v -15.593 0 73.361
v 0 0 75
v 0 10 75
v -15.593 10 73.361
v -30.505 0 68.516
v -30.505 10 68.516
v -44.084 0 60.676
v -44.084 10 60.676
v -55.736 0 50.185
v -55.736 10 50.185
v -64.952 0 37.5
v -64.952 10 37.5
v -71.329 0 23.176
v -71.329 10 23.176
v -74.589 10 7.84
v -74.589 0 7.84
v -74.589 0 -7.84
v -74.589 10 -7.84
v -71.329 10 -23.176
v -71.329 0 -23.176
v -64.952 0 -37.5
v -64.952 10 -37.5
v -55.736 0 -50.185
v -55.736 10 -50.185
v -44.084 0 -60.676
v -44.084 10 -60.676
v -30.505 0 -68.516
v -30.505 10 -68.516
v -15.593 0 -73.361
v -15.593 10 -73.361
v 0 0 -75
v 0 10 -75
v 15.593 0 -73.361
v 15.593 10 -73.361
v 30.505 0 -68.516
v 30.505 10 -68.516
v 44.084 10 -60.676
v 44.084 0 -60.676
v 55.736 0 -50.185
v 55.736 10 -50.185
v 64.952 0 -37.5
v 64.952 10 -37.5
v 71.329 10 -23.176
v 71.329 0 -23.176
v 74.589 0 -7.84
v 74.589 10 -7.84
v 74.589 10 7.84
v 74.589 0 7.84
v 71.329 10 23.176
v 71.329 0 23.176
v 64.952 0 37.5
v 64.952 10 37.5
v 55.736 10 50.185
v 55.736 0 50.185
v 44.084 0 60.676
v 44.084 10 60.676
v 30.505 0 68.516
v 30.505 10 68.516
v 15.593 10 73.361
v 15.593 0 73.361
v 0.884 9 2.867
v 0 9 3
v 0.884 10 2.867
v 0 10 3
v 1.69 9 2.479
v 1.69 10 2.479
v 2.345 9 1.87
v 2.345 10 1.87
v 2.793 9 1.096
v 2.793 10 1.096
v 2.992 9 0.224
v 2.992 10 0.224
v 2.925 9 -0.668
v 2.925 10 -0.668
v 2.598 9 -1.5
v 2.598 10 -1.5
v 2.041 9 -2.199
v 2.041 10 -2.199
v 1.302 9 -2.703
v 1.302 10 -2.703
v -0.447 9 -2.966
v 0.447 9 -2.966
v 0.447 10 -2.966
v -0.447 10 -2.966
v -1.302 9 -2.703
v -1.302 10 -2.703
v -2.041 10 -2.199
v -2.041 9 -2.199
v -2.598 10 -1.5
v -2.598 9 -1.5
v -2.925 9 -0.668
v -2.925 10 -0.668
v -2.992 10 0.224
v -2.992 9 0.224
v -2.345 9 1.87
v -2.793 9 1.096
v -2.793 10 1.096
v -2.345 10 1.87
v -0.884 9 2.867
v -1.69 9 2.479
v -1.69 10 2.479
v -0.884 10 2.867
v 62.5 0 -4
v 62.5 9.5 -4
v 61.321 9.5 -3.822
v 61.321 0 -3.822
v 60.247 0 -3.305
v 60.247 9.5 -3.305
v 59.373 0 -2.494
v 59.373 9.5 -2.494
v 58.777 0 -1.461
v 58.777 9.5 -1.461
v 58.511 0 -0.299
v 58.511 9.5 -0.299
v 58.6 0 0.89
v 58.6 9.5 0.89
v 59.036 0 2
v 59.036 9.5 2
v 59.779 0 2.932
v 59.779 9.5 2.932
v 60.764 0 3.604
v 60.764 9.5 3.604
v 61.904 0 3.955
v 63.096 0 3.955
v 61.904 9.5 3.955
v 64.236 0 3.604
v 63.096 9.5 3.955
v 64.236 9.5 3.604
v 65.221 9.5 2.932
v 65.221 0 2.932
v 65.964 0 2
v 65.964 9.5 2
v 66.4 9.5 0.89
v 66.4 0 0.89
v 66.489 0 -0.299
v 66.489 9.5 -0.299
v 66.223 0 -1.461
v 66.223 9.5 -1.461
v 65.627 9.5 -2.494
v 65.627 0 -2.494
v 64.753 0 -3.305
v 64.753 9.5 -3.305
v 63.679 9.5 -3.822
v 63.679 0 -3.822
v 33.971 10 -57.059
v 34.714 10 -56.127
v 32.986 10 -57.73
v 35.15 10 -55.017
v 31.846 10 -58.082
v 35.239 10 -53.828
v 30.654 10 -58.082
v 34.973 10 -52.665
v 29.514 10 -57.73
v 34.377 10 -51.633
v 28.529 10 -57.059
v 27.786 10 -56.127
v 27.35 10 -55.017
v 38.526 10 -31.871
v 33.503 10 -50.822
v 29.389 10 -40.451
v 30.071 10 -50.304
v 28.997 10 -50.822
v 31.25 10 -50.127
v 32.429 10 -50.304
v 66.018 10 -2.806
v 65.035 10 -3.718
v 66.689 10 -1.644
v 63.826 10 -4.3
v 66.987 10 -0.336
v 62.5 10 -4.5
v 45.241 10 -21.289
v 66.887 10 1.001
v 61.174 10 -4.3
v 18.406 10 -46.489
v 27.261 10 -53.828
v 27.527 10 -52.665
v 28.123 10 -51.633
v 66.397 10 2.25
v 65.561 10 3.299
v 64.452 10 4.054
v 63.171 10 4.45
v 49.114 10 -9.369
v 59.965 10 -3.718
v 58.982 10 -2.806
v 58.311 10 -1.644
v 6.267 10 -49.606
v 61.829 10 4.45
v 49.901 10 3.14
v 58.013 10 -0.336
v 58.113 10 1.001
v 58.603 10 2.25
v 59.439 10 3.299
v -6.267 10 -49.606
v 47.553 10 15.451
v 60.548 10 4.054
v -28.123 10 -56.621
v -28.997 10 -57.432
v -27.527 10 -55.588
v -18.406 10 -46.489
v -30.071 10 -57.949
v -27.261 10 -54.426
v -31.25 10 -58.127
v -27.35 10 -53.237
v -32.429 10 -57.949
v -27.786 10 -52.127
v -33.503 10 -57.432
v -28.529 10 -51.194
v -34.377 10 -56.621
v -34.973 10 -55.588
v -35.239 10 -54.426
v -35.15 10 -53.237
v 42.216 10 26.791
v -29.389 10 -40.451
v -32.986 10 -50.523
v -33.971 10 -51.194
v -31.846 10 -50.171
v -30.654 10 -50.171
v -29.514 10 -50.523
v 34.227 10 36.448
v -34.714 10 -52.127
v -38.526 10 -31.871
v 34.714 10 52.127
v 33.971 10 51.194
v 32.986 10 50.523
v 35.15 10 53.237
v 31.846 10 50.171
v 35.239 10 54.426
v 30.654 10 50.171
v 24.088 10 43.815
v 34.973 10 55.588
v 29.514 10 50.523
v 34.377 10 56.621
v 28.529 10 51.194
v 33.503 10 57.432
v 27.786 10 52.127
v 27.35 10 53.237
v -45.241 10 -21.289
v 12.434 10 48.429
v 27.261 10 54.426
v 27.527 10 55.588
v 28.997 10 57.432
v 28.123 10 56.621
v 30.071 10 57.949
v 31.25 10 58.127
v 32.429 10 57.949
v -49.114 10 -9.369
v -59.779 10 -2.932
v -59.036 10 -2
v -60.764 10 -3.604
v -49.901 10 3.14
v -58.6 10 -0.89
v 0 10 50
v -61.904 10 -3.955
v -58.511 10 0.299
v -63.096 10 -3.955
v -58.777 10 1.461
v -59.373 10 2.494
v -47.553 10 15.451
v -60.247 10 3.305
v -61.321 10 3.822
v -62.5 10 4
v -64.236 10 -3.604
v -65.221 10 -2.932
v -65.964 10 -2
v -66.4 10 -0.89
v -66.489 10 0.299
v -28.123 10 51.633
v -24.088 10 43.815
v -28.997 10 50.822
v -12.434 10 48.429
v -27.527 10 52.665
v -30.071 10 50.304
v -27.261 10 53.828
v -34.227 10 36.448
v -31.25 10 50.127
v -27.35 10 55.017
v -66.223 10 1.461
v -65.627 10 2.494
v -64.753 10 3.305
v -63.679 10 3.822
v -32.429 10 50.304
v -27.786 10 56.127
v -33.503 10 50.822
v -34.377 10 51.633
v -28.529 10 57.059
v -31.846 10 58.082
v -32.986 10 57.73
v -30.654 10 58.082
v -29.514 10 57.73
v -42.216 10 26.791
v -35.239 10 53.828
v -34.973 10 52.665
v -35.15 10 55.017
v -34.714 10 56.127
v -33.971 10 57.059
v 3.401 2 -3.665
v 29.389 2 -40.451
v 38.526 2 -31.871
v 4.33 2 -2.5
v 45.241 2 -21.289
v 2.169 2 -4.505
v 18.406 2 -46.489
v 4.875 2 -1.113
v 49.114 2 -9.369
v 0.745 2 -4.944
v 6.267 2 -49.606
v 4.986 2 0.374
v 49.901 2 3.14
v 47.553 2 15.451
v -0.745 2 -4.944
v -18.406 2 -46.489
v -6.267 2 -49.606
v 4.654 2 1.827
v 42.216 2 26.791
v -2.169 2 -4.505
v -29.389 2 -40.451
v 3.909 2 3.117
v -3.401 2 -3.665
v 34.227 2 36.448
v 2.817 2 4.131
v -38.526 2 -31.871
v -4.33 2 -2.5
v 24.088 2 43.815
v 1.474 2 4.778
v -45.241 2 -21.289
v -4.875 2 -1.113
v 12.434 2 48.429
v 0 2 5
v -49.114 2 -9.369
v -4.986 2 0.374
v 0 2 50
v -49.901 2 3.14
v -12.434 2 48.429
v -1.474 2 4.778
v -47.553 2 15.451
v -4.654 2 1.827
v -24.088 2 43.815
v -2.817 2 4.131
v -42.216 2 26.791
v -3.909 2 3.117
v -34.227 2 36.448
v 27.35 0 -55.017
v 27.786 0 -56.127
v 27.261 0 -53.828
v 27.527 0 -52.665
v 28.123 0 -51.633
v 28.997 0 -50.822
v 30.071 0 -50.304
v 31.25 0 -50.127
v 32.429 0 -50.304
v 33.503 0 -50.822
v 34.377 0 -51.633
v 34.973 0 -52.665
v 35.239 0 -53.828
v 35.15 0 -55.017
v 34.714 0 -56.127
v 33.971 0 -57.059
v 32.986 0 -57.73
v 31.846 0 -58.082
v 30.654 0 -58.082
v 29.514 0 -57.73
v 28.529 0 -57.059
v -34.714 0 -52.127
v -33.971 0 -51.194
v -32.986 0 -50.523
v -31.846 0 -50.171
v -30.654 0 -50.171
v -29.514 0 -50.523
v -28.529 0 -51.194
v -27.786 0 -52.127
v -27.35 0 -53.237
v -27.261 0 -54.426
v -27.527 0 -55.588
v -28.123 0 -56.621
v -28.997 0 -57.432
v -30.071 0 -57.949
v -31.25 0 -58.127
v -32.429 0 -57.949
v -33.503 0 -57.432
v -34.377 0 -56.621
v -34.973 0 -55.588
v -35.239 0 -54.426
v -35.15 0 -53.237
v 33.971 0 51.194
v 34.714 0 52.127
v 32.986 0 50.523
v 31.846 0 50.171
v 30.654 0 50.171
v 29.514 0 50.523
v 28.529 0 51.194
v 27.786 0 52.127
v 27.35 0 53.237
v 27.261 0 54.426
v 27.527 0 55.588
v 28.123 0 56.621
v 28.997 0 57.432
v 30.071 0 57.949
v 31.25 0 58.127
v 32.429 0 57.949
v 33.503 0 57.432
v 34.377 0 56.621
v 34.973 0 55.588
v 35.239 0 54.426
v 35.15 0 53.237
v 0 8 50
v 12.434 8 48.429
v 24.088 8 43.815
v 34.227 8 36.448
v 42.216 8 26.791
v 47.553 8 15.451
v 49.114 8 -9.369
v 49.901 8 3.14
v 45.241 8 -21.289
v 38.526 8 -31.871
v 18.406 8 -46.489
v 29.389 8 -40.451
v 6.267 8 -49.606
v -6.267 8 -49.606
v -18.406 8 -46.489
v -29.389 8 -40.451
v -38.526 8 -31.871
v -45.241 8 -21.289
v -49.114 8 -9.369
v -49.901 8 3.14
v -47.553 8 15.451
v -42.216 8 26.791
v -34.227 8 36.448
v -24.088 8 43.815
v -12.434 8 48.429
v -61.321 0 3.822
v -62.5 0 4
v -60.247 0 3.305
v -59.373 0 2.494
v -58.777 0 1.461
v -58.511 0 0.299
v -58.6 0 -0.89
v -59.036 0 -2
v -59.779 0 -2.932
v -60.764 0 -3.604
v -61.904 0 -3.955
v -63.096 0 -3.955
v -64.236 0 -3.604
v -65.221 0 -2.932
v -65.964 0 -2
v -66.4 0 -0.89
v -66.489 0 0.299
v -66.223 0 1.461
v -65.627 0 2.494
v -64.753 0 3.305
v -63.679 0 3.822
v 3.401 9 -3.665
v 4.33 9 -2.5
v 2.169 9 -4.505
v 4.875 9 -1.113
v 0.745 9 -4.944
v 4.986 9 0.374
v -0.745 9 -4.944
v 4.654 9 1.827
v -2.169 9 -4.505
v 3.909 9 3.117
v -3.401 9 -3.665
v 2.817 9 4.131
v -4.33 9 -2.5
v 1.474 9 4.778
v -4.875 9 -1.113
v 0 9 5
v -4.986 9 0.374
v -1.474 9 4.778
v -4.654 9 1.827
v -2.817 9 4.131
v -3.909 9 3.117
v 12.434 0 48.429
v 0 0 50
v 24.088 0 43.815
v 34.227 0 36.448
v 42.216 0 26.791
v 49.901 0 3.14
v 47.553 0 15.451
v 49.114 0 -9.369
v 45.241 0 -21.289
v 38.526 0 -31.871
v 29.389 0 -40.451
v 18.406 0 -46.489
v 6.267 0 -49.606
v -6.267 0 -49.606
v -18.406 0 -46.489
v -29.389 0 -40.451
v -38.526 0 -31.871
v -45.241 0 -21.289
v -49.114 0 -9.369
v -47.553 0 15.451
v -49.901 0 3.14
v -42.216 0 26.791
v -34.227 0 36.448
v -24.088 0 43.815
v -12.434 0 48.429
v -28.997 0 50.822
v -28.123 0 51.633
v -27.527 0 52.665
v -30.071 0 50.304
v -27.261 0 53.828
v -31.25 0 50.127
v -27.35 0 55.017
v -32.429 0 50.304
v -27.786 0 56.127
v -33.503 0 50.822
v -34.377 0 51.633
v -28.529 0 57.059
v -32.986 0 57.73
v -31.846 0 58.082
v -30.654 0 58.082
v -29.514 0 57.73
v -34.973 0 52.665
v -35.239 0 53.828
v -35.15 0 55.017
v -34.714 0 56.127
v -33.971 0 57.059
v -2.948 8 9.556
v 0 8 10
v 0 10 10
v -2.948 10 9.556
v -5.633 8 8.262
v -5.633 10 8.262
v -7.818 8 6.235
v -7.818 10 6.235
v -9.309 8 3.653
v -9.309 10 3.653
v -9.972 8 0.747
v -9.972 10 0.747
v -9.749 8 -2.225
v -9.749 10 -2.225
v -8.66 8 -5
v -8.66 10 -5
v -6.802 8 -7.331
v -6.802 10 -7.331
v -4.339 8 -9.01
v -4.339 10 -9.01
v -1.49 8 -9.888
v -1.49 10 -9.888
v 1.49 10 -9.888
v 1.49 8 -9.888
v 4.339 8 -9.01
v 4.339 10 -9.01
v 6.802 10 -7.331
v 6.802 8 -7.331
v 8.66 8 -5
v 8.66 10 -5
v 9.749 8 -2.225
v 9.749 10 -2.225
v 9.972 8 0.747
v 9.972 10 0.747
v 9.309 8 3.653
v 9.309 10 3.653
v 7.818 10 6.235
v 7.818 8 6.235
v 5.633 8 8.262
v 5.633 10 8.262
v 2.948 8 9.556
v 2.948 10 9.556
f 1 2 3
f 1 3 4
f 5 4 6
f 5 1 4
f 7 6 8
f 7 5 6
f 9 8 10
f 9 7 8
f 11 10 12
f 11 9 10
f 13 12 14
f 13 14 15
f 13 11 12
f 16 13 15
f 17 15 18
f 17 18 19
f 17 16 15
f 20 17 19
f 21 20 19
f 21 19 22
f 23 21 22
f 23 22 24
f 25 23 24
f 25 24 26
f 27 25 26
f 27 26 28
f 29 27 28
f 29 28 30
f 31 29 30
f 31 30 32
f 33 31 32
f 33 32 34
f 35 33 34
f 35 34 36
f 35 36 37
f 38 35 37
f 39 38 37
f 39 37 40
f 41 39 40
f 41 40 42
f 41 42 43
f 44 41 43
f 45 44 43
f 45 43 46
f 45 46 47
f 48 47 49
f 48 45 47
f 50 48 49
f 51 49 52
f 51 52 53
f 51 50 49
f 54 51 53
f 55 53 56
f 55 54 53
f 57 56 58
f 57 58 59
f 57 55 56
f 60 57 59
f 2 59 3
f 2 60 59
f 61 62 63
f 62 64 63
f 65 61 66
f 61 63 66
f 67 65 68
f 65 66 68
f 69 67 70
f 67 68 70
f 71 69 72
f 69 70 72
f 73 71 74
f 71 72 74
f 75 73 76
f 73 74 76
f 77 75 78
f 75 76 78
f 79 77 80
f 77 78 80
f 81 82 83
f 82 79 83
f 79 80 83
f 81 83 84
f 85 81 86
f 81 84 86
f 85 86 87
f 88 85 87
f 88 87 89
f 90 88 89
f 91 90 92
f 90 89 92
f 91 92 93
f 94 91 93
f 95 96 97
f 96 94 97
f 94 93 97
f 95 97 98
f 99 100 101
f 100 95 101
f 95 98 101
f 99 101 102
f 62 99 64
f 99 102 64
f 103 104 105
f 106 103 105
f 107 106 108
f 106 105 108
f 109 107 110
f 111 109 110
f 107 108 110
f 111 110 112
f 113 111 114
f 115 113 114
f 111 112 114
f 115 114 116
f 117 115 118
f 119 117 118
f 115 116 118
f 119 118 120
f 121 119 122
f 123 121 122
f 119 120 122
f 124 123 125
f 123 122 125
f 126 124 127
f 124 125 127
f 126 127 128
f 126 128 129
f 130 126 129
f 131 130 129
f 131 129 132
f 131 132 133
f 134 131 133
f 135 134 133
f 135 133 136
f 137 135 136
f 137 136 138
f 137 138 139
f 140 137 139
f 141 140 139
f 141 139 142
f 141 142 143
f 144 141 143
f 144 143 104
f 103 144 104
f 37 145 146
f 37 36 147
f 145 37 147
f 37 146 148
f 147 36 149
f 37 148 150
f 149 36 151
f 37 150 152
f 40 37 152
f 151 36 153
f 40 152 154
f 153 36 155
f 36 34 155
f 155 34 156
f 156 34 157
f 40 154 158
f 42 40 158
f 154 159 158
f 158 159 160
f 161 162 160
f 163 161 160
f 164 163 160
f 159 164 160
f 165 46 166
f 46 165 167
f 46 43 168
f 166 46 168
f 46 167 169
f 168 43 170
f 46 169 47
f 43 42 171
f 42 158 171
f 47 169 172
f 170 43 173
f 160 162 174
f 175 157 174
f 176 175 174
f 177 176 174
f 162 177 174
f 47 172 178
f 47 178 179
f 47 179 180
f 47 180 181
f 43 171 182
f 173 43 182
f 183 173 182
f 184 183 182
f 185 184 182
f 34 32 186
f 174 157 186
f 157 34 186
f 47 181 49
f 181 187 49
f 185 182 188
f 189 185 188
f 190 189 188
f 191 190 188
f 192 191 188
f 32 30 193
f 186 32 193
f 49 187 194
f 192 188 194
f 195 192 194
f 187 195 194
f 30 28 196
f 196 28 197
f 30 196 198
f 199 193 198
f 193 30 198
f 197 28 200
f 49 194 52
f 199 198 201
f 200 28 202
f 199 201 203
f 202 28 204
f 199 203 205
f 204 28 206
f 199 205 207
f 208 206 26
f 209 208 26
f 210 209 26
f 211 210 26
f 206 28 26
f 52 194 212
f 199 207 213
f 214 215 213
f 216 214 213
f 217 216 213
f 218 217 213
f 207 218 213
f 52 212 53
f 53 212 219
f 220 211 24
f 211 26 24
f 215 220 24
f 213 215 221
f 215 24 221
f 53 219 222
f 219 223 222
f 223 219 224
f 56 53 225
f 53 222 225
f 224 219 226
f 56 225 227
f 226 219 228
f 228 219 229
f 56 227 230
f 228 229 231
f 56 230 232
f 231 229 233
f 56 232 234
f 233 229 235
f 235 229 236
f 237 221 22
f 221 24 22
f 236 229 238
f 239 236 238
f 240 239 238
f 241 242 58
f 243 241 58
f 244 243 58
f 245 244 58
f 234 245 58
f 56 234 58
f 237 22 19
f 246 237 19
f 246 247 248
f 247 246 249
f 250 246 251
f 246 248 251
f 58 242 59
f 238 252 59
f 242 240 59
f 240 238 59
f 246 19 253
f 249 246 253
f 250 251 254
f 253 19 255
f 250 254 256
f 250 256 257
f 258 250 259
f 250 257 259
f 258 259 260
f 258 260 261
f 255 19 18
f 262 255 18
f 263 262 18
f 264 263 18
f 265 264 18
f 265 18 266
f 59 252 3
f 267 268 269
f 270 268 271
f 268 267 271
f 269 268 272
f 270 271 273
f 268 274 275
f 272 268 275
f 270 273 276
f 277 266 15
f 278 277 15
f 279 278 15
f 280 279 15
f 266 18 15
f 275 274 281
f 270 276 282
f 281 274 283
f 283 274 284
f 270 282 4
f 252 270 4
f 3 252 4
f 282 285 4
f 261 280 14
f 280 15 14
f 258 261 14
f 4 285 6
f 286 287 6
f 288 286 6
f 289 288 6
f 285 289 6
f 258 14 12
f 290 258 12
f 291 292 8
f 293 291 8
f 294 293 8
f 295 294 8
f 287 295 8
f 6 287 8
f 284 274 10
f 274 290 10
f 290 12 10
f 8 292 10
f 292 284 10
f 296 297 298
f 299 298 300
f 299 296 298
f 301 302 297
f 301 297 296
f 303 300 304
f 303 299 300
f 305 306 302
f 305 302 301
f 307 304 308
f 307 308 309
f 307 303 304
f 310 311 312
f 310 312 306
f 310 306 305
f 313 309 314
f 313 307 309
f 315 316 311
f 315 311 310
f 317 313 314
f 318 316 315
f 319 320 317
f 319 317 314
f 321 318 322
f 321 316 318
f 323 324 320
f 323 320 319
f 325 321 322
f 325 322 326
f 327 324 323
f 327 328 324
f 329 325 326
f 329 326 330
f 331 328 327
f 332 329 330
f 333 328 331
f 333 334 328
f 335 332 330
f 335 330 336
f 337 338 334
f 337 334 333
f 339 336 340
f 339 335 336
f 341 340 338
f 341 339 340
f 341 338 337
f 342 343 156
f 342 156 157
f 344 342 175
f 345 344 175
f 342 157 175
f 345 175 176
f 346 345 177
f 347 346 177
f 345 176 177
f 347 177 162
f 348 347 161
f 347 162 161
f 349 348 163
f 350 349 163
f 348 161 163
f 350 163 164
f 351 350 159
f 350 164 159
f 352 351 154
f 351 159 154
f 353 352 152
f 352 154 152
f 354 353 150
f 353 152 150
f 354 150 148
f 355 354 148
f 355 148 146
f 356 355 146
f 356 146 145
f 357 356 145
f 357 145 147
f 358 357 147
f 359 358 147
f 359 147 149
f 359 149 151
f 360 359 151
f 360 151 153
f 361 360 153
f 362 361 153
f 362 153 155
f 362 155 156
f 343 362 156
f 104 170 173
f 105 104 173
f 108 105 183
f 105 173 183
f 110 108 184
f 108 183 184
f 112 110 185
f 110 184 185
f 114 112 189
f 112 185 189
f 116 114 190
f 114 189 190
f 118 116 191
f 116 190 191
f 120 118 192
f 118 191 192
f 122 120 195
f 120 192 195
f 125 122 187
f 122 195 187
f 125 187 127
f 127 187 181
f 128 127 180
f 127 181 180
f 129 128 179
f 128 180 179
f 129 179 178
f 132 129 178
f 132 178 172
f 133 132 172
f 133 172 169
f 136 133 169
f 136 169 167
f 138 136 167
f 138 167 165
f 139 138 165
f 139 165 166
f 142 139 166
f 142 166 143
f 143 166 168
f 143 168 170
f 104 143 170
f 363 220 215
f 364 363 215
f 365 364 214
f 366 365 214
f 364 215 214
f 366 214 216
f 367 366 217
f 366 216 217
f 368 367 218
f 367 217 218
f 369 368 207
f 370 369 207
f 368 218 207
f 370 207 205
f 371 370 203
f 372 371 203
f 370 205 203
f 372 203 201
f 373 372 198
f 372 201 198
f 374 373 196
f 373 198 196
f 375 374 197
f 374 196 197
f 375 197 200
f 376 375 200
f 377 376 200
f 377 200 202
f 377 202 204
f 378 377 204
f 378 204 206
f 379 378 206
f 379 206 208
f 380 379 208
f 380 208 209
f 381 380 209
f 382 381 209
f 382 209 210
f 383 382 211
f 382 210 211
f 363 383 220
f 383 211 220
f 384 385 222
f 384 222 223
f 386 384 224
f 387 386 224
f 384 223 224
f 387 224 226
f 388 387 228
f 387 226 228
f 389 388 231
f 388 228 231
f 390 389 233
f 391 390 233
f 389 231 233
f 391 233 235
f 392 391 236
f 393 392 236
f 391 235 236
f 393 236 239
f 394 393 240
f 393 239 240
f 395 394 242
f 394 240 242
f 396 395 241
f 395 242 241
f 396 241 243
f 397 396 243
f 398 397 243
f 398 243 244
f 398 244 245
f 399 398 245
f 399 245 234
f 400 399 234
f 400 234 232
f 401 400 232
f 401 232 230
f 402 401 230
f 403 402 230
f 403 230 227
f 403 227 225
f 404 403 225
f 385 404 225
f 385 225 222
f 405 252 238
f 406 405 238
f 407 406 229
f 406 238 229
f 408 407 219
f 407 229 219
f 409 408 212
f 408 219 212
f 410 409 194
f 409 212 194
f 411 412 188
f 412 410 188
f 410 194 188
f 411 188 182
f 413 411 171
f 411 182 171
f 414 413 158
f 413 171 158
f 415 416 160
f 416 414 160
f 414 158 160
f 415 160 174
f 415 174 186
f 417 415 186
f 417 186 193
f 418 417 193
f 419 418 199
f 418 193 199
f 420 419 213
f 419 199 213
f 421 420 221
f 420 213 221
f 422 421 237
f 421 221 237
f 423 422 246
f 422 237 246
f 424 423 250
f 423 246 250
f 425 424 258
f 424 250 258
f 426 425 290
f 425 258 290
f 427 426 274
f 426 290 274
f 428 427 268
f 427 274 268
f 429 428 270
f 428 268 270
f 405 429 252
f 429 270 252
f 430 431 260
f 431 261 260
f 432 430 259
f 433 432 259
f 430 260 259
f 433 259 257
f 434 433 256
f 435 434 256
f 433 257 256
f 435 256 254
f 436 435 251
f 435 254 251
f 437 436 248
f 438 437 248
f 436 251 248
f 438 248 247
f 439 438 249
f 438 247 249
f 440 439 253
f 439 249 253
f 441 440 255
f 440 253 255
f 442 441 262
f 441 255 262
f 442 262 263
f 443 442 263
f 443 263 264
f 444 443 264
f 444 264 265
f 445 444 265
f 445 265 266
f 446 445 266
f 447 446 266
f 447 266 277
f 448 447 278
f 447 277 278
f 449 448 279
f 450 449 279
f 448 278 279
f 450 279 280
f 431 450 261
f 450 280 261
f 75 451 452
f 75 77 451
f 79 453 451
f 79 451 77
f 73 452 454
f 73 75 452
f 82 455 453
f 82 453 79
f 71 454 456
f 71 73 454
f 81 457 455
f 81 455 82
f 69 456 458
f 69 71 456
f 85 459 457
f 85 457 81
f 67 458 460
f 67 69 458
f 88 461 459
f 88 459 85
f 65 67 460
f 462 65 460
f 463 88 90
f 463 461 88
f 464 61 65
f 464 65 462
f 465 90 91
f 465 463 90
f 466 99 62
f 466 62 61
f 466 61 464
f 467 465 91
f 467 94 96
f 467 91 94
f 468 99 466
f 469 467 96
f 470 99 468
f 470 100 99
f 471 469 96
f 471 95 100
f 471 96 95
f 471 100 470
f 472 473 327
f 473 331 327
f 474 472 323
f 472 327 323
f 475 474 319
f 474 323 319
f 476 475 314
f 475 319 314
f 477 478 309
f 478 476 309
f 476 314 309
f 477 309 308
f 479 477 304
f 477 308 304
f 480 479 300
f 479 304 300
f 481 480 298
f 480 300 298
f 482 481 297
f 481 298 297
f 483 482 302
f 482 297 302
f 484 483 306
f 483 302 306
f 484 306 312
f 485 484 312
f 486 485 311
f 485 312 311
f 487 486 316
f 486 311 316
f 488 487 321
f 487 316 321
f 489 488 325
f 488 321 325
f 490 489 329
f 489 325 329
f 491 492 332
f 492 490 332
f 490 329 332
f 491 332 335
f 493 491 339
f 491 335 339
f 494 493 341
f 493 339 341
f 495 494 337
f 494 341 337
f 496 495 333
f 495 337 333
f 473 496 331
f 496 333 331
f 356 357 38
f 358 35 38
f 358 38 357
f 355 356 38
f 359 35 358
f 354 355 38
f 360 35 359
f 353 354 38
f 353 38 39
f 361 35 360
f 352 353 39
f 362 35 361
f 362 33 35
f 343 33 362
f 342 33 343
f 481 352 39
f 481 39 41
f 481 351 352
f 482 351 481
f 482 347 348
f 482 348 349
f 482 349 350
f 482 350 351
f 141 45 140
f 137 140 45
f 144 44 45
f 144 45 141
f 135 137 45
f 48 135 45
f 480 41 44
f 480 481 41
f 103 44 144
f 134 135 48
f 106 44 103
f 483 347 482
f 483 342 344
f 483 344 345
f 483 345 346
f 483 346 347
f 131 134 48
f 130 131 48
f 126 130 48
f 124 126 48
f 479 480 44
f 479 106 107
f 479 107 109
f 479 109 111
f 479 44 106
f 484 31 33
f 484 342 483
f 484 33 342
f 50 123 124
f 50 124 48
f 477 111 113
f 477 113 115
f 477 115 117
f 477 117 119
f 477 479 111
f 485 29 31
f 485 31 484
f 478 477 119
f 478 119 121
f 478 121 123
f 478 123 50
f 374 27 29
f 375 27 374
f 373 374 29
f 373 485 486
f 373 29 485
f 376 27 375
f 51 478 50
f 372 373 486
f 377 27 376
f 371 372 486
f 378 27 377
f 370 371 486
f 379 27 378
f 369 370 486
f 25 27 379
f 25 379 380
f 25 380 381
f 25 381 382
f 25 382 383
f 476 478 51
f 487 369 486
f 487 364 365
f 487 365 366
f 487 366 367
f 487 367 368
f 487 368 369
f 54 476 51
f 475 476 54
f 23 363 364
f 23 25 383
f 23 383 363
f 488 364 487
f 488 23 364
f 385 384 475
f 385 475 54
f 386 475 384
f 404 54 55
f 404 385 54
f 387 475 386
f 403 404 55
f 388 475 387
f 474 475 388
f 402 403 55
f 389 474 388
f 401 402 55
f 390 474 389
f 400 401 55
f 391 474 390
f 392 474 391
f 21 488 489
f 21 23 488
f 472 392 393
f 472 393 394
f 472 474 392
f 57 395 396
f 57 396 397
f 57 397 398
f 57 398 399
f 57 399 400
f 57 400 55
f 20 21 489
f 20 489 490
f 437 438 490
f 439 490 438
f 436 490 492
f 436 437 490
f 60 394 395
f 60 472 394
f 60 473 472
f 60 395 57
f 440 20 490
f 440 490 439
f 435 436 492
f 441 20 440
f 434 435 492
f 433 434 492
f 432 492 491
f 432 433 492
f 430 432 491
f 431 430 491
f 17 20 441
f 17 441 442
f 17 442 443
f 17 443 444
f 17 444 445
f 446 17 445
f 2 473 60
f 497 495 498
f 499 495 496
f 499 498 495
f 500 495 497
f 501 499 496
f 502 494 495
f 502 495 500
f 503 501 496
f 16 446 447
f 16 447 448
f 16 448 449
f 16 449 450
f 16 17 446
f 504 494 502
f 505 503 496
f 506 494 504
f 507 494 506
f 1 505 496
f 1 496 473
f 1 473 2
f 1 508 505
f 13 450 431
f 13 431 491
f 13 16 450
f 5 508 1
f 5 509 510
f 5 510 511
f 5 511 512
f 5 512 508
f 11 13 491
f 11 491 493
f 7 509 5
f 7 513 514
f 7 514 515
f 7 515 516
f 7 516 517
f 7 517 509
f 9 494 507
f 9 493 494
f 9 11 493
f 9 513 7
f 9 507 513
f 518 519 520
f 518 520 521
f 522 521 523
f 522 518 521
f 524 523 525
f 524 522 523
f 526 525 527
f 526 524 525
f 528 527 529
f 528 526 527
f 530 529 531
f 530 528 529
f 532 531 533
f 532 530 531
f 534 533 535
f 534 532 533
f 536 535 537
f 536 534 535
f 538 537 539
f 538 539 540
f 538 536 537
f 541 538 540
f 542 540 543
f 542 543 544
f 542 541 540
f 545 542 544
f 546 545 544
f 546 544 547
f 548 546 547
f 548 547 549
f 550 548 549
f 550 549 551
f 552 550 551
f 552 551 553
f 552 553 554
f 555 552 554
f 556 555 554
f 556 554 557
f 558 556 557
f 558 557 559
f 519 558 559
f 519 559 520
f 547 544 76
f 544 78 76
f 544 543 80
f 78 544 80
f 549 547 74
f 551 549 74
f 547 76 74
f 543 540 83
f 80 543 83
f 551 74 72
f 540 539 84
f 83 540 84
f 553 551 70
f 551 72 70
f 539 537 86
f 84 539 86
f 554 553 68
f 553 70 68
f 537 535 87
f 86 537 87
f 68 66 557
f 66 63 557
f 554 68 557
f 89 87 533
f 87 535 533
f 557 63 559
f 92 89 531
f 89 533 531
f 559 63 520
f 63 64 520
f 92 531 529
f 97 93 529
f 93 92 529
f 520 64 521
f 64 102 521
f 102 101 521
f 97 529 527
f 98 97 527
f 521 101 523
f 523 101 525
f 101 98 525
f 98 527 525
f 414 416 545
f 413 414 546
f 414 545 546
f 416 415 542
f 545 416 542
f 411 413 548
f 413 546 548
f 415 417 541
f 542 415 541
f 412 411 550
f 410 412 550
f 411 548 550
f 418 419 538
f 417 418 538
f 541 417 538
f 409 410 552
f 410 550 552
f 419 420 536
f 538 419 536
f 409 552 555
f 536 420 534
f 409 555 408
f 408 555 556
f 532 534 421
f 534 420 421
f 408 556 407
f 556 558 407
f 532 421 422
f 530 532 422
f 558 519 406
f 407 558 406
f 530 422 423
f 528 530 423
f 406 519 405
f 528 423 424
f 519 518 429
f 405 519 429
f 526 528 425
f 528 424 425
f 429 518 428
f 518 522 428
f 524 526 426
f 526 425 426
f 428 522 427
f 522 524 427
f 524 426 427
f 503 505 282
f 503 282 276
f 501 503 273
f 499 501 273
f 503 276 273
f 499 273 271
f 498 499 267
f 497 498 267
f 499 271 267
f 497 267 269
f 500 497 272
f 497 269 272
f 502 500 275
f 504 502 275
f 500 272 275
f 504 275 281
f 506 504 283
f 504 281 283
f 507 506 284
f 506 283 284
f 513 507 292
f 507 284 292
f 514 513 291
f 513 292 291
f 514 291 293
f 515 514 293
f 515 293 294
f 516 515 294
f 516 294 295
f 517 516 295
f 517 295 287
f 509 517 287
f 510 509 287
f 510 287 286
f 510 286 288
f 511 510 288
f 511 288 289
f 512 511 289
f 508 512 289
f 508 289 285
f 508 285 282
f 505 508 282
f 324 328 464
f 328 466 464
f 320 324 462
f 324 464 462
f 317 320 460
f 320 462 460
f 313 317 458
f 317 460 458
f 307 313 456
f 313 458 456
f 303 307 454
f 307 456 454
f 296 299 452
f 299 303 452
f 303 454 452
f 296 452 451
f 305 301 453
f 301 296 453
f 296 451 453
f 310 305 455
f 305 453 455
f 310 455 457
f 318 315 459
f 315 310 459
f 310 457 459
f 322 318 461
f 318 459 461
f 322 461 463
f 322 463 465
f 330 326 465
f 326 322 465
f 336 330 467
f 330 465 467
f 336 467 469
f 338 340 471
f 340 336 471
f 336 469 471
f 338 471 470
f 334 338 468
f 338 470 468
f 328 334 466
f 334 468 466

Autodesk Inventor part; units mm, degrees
ref_plane "YZ Plane" through (0, 0, 0) normal (1, 0, 0) x (0, 1, 0)
ref_plane "XZ Plane" through (0, 0, 0) normal (0, 1, 0) x (-1, 0, 0)
ref_plane "XY Plane" through (0, 0, 0) normal (0, 0, 1) x (1, 0, 0)
sketch "Sketch1" plane through (0, 0, 0) normal (1, 0, 0) x (0, 1, 0)
  line L0 (2, 5) -> (9, 5)
  line L1 (9, 5) -> (9, 3)
  line L2 (9, 3) -> (10, 3)
  line L3 (10, 3) -> (10, 10)
  line L4 (10, 10) -> (8, 10)
  line L5 (8, 10) -> (8, 50)
  line L6 (8, 50) -> (10, 50)
  line L7 (10, 50) -> (10, 75)
  line L8 (10, 75) -> (0, 75)
  line L9 (0, 75) -> (0, 50)
  line L10 (0, 50) -> (2, 50)
  line L11 (2, 50) -> (2, 5)
  line L12 (24.985, 0) -> (-21.0801, 0)
  line L13 (0, 63.0325) -> (0, -71.2298) construction
  point P0 (0, 0)
  point P1 (5.5, 5)
  point P2 (5, 75)
  dimension "d0" = 150
  dimension "d1" = 10
  dimension "d2" = 2
  dimension "d3" = 7
  dimension "d4" = 1
  dimension "d5" = 7
  dimension "d6" = 2
  dimension "d7" = 25
  dimension "d8" = 47
  dimension "d9" = 0
  dimension "d10" = 70
revolve "Revolution1" add sketch "Sketch1" angle 360 about axis through (0, 24.985, 0) along (0, -1, 0)
sketch "Sketch2" plane through (0, 2, 0) normal (0, -1, 0) x (1, 0, 0)
  point P0 (0, 0)
sketch "Sketch3" plane through (0, 0, 0) normal (0, -1, 0) x (1, 0, 0)
  circle A0 centre (0, 0) radius 62.5
  circle A1 centre (62.5, 0) radius 4
  dimension "d12" = 125
  dimension "d13" = 8
hole "Hole1" at (62.5, 0, 0) direction (0, 1, 0) diameter 8 end through all
chamfer "Chamfer1" distance 0.5 angle 45 1 edges at (62.5, 10, 4)
pattern_circular "Circular Pattern1" count 6 over 360 about axis through (0, 5, 0) along (0, -1, 0) of "Hole1"
properties part number "10_Nap_cua_tham"
